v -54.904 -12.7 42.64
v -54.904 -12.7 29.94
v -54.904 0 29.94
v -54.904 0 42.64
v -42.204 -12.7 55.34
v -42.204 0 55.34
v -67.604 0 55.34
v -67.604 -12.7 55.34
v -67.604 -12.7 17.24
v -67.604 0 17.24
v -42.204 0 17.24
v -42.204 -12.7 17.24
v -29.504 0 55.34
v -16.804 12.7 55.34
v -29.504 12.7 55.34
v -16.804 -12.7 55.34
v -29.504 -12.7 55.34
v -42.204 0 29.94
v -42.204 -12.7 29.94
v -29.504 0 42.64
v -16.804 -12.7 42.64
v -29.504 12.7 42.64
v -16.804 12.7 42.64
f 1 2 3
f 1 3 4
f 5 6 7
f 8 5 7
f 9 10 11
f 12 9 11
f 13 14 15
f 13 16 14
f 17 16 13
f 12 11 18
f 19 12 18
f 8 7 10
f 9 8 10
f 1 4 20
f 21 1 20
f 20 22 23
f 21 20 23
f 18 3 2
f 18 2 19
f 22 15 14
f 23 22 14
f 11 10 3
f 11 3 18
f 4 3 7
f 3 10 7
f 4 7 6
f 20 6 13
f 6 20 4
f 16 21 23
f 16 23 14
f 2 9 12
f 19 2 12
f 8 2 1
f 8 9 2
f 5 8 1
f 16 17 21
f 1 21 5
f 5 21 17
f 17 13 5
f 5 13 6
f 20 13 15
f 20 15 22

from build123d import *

# Parameters (mm, degrees)
F1_DEPTH = 12.7
F0_W     = 12.7
F0_H     = 12.7
F2_DEPTH = 12.7


# Not quite as in the source:
# - ends of sketch curves that miss each other by under 0.0002 mm in the source are joined


with BuildPart() as f1:
    # F0 (on Front) → F1 (new body, symmetric)
    with BuildSketch(Plane.XZ):
        Polygon((-29.5039405265, 55.3395837995), (-29.5039405265, 42.6395821044), (-16.8039405265, 42.6395821044), (-16.8039405265, 55.3395821044), align=None)
    extrude(amount=F1_DEPTH, both=True)

    # F0 (on Front) → F2 (join)
    with BuildSketch(Plane.XZ):
        Polygon((-42.2039422216, 55.3395821044), (-42.2039422216, 42.6395821044), (-29.5039405265, 42.6395821044), (-29.5039405265, 55.3395837995), align=None)
        with Locations((-48.5539422216, 48.9895821044)):
            Rectangle(F0_W, F0_H)
        with Locations((-61.2539422216, 48.9895821044)):
            Rectangle(F0_W, F0_H)
        with Locations((-61.2539422216, 36.2895821044)):
            Rectangle(F0_W, F0_H)
        with Locations((-61.2539422216, 23.5895821044)):
            Rectangle(F0_W, F0_H)
        with Locations((-48.5539422216, 23.5895821044)):
            Rectangle(F0_W, F0_H)
    extrude(amount=F2_DEPTH)


solid = f1.part
